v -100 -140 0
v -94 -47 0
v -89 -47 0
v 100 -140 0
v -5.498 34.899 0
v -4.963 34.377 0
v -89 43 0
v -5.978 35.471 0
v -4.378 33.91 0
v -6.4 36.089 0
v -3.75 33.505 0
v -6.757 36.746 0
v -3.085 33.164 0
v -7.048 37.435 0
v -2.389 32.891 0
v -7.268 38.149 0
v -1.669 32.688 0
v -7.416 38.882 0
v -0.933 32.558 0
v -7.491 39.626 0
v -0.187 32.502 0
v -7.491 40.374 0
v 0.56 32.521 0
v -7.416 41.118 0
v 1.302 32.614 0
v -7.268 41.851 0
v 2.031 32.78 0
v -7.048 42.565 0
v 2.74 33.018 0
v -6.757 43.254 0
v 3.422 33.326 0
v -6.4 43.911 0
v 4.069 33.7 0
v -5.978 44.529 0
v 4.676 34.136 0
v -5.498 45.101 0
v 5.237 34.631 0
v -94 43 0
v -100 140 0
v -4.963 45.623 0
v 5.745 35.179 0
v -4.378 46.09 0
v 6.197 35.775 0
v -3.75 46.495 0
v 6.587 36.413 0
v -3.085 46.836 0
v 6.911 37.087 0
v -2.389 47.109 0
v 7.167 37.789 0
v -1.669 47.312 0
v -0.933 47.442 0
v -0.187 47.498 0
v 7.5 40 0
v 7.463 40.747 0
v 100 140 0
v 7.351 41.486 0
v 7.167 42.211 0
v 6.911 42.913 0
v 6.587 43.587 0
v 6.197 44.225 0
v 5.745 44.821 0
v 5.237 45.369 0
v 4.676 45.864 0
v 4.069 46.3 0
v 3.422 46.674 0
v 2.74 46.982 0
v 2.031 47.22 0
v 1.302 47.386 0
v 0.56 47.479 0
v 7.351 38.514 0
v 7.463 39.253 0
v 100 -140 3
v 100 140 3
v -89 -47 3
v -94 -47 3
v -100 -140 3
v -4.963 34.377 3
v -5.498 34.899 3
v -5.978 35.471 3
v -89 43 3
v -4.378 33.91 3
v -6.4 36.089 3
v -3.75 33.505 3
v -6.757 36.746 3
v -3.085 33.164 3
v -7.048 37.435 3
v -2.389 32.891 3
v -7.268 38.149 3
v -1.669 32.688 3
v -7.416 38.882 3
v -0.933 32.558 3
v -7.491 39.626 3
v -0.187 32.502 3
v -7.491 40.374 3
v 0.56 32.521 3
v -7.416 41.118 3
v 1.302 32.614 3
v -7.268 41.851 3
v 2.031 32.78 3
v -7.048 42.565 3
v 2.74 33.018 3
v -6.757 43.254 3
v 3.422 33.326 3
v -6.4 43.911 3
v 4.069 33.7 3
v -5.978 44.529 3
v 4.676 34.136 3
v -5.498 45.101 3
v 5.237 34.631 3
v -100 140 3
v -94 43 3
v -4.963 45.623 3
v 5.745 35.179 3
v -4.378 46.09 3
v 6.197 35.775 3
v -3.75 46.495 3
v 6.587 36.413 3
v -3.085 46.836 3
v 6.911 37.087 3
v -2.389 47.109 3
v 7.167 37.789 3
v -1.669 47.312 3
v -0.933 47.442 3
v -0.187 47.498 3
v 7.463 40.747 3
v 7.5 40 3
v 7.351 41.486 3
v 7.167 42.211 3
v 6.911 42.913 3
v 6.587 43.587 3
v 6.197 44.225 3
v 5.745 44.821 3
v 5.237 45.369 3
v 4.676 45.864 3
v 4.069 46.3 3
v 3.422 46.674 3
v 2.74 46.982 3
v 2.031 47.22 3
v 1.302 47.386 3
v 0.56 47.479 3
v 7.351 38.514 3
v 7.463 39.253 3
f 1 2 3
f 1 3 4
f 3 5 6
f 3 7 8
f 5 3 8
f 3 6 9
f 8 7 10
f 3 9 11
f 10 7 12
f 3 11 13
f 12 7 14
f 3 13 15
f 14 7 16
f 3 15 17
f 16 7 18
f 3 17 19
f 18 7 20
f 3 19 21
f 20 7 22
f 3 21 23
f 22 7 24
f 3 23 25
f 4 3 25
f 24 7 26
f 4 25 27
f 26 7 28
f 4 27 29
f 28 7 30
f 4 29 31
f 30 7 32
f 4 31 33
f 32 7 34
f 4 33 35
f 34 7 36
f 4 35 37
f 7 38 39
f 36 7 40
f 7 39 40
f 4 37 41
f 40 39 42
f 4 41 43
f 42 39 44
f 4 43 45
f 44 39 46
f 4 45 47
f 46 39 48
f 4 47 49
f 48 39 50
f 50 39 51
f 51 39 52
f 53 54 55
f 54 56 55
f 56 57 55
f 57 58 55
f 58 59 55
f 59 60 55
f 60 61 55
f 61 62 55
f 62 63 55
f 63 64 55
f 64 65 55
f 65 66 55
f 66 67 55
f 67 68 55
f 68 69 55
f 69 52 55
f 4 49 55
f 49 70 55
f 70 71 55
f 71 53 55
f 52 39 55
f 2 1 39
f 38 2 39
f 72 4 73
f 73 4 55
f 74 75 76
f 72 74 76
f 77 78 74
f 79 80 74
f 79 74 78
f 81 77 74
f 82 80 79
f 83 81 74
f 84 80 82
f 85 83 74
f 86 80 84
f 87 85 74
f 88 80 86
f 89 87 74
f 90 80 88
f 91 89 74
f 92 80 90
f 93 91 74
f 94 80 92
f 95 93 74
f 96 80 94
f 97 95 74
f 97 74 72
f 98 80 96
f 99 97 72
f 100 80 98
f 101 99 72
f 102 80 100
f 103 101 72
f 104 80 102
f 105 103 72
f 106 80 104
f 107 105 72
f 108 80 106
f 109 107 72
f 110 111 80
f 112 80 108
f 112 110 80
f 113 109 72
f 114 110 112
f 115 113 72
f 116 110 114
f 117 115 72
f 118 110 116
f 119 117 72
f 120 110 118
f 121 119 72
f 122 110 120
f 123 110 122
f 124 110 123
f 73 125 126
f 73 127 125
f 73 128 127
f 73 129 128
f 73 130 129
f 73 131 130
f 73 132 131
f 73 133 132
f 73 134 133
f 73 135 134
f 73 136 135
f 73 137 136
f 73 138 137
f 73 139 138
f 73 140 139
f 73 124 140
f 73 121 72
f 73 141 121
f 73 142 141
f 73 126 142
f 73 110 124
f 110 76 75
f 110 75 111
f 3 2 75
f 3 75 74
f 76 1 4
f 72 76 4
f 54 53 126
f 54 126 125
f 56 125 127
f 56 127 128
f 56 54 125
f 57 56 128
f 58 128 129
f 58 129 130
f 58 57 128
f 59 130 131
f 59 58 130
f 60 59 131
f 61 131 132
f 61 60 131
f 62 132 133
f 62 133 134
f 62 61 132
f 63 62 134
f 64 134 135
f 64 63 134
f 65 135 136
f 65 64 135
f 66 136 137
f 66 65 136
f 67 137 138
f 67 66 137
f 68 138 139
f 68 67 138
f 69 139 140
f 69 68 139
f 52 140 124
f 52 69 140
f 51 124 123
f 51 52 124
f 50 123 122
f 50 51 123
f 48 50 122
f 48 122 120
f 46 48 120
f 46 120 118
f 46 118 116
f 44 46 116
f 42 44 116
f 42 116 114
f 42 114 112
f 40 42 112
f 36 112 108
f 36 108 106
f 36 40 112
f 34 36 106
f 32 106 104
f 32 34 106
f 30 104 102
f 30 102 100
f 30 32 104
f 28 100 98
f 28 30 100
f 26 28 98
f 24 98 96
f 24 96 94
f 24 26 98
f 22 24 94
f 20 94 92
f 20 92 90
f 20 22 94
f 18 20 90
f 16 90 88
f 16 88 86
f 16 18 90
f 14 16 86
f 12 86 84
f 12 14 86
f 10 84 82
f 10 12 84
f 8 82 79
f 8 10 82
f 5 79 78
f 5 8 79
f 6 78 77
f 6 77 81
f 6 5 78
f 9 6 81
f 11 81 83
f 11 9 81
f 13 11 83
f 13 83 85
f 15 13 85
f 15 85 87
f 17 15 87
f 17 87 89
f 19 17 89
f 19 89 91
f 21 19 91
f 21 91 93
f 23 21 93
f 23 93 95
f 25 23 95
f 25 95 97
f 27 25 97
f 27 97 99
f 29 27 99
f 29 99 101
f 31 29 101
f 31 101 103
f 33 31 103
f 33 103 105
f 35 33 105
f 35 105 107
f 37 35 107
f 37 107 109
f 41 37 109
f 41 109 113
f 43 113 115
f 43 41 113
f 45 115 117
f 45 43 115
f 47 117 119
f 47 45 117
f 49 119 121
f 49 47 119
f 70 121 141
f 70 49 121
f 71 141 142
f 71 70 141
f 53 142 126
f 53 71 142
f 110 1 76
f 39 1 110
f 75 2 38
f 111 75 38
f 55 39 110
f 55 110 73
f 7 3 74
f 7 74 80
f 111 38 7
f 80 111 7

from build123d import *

# Parameters (mm, degrees)
SKETCH_1_W      = 200
SKETCH_1_H      = 280
SKETCH_1_R      = 7.5
SKETCH_1_W_2    = 5
SKETCH_1_H_2    = 90
EXTRUDE_1_DEPTH = 3


with BuildPart() as part:
    # 草圖1 → 填料-伸長1 (new body)
    with BuildSketch(Plane.XY):
        Rectangle(SKETCH_1_W, SKETCH_1_H)
        with Locations((0, 40)):
            Circle(SKETCH_1_R, mode=Mode.SUBTRACT)
        with Locations((-91.5, -2)):
            Rectangle(SKETCH_1_W_2, SKETCH_1_H_2, mode=Mode.SUBTRACT)
    extrude(amount=EXTRUDE_1_DEPTH)


solid = part.part
